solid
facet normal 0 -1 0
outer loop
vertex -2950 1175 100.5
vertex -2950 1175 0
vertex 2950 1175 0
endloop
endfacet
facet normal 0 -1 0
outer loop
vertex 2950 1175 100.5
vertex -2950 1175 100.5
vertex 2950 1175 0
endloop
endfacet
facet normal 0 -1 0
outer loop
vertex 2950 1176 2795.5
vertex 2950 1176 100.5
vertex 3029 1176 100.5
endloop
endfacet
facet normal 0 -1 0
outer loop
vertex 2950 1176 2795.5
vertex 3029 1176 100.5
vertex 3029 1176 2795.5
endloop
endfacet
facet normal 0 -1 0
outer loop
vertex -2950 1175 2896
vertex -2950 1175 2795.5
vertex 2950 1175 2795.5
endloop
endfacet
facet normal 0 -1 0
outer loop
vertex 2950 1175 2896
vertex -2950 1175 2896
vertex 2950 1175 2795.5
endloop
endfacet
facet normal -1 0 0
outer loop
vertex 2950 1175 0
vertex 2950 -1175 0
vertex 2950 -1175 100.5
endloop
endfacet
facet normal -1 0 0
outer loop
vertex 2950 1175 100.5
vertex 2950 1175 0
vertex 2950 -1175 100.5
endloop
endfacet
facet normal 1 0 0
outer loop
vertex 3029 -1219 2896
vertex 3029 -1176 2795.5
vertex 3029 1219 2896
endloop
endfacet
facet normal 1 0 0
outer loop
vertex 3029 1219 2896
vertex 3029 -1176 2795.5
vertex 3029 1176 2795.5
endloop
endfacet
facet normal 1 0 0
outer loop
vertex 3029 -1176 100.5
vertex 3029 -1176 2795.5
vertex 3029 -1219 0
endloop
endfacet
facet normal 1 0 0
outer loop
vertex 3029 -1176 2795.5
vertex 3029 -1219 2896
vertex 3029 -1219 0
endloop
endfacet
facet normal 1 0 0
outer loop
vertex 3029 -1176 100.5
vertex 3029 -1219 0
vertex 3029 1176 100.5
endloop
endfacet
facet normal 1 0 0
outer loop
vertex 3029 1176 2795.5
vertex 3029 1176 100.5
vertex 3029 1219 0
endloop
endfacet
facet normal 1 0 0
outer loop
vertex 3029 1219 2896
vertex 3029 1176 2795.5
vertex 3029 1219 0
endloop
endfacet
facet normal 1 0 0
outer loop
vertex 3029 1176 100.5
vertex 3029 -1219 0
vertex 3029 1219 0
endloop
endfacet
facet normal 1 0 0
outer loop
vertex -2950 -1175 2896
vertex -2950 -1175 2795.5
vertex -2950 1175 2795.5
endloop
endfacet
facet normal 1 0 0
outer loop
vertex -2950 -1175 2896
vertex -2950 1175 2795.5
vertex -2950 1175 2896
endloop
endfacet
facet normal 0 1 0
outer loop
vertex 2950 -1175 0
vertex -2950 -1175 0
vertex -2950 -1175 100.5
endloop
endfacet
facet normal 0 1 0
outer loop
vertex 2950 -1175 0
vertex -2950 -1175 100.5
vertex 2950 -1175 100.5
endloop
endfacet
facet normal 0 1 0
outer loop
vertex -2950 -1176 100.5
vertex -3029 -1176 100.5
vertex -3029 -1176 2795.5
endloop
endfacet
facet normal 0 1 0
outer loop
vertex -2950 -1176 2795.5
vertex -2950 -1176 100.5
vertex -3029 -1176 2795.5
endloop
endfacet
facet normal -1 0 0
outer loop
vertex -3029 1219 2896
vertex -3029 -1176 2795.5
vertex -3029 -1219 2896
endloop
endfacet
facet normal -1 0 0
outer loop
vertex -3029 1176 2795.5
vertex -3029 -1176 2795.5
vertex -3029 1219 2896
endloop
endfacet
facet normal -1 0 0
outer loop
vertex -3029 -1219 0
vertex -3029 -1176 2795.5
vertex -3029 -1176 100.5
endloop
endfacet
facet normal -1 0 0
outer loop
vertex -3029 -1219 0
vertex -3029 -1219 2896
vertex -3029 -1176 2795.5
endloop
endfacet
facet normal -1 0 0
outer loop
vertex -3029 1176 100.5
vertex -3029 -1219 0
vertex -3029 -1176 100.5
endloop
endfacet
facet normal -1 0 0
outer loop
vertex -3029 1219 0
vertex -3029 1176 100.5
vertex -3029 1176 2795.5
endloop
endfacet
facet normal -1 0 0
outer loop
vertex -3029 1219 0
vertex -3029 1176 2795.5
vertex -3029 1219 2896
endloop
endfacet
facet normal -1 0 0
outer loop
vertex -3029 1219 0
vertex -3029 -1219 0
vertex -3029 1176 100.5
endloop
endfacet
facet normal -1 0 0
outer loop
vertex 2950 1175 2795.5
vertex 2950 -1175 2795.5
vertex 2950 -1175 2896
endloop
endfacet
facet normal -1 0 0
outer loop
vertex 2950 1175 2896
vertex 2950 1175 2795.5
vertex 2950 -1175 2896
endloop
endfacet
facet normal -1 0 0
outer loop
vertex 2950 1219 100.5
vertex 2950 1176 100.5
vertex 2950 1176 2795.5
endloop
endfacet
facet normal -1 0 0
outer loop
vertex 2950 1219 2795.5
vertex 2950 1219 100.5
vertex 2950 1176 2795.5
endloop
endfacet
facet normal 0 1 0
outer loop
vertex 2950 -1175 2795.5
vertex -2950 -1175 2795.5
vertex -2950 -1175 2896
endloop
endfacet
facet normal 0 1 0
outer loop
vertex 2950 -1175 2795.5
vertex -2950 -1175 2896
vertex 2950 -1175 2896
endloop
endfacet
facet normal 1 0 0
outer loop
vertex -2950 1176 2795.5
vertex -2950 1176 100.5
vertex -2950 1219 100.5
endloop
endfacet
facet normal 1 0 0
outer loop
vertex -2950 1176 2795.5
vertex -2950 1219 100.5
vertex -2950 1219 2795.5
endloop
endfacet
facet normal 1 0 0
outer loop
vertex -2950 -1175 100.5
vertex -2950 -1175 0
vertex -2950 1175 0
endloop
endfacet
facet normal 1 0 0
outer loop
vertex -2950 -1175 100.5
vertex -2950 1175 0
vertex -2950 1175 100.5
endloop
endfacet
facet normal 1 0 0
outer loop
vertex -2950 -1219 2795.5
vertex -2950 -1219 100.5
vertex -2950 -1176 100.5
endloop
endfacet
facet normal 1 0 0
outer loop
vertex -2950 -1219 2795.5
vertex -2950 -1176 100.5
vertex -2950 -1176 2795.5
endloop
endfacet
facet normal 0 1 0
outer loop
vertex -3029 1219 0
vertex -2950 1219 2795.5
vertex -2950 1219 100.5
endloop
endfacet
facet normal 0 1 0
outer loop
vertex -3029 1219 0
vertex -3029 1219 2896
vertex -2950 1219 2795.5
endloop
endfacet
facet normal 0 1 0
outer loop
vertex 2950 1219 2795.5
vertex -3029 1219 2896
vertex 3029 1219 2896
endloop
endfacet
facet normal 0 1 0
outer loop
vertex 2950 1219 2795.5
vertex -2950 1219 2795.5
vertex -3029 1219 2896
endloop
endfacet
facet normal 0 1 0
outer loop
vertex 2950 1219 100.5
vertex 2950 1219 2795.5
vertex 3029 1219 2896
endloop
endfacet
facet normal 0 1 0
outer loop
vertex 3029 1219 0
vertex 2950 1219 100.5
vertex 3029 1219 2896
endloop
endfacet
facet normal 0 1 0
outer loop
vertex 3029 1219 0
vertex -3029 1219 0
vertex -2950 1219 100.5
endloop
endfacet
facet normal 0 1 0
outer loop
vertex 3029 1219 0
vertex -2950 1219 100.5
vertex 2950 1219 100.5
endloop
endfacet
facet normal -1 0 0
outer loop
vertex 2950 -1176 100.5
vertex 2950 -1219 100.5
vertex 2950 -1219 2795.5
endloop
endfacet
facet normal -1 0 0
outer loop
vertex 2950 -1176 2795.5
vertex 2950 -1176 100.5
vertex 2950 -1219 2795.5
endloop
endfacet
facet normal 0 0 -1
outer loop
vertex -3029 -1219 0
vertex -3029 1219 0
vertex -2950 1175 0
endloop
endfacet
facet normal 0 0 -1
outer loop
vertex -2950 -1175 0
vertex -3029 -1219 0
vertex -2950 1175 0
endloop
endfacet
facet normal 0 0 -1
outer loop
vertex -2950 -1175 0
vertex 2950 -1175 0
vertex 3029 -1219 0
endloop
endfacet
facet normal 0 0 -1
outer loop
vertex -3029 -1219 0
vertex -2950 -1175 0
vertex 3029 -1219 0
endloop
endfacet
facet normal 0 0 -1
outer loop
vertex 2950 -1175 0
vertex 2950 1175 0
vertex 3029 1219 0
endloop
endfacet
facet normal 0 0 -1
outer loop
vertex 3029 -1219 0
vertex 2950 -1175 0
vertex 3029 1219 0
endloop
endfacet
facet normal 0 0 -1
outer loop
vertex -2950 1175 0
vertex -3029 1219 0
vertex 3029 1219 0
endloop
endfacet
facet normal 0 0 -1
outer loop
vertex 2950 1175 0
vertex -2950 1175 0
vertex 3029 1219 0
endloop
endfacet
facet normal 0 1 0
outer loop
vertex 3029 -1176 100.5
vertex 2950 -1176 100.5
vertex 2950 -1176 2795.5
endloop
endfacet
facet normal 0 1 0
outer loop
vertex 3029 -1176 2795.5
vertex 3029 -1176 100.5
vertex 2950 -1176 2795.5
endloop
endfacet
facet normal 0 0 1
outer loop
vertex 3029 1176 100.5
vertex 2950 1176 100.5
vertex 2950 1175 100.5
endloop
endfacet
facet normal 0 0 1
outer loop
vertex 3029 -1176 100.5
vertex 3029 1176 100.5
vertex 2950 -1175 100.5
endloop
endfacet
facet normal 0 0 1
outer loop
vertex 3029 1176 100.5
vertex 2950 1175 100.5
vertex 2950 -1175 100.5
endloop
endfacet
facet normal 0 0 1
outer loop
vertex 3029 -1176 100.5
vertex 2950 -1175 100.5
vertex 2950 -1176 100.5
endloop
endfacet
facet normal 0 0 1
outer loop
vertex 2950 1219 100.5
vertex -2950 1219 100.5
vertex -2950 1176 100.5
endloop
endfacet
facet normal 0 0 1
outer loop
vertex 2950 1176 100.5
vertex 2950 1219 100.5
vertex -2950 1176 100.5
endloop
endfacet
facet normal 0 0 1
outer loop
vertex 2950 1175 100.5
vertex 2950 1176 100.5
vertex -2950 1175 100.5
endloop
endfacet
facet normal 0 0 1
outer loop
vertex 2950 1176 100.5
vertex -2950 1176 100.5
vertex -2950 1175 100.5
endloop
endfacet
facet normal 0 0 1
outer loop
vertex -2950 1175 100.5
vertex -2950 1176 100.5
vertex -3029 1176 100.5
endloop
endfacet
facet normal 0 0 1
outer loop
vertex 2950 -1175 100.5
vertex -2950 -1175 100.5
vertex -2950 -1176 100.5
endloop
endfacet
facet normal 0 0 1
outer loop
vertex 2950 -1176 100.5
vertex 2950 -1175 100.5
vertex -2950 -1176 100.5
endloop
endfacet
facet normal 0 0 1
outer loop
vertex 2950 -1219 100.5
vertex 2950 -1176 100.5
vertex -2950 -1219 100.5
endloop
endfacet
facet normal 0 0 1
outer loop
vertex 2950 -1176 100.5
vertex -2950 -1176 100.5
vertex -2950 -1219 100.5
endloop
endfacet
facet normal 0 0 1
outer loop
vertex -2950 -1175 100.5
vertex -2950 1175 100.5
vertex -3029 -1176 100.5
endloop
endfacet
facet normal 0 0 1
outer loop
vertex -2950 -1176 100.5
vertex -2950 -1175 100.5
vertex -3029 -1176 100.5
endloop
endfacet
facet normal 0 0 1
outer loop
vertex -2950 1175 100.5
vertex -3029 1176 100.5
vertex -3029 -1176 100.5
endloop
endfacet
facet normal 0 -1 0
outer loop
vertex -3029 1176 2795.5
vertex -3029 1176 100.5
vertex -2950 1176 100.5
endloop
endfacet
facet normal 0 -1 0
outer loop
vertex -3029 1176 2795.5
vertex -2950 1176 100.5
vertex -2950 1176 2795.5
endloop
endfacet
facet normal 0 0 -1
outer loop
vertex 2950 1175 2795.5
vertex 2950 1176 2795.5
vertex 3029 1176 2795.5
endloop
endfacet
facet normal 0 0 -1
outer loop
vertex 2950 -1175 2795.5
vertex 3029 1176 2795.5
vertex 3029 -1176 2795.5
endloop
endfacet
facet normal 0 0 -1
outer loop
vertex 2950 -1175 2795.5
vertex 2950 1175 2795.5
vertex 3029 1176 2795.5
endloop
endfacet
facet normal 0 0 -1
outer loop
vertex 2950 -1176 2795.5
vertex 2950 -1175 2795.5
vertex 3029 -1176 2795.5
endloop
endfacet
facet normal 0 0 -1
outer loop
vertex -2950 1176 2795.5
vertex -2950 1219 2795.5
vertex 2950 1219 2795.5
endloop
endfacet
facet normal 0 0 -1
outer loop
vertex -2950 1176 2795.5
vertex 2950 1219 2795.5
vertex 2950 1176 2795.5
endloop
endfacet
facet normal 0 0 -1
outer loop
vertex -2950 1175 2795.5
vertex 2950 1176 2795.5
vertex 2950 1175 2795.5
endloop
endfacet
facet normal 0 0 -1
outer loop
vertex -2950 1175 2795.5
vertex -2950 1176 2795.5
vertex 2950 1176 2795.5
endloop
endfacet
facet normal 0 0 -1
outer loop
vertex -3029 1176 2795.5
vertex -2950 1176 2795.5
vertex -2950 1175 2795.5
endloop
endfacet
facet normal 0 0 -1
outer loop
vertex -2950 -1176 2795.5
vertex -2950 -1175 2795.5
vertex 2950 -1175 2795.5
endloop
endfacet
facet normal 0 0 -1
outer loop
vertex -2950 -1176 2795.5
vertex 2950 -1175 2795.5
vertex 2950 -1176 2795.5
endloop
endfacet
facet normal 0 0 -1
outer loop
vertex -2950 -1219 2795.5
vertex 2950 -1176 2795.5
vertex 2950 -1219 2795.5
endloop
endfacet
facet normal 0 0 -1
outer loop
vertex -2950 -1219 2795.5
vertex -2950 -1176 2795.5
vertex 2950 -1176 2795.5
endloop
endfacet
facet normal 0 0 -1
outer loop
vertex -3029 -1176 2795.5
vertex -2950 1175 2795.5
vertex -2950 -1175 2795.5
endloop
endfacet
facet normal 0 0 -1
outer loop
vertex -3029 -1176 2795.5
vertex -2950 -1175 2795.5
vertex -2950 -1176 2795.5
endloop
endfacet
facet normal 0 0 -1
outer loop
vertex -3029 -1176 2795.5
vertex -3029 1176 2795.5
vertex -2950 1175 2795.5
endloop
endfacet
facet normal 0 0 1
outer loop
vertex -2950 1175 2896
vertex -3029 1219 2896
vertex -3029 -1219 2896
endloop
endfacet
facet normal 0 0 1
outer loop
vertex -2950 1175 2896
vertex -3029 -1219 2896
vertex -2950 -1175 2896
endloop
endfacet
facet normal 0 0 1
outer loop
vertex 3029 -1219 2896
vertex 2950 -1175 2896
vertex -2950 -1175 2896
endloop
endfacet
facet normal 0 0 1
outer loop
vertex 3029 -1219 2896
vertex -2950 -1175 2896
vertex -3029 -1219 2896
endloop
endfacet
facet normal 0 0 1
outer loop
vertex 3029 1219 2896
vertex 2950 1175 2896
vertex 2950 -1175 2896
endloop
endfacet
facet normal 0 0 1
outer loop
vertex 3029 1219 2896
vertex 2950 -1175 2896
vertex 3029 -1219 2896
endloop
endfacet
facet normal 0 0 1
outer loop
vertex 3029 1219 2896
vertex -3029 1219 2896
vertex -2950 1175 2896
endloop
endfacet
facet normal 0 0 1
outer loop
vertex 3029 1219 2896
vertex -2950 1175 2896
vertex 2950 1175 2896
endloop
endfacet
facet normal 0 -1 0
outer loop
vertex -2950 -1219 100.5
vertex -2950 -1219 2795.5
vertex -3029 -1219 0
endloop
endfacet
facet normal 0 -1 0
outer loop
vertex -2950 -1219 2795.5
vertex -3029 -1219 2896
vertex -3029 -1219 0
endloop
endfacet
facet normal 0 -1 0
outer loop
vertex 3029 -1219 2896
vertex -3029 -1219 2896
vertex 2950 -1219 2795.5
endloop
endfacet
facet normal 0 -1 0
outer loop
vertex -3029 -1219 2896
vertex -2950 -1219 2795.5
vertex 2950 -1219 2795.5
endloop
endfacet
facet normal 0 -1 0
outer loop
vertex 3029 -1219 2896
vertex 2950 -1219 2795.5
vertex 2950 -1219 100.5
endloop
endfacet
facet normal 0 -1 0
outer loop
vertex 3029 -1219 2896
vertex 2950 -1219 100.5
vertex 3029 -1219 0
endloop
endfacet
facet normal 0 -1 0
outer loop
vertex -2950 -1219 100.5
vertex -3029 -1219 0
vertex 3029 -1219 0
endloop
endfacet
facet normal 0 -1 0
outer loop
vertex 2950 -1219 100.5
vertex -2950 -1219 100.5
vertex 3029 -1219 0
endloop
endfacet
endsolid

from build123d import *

# Parameters (mm, degrees)
F4_W     = 6058
F4_H     = 2438
F4_W_2   = 5900
F4_H_2   = 2350
F0_DEPTH = 2896
F1_W     = 5900
F1_H     = 2695
F5_DEPTH = 2438.001
F2_W     = 2352
F2_H     = 2695
F3_DEPTH = 6058.001


with BuildPart() as f0:
    # F4 (on Top) → F0 (new body)
    with BuildSketch(Plane.XY):
        Rectangle(F4_W, F4_H)
        Rectangle(F4_W_2, F4_H_2, mode=Mode.SUBTRACT)
    extrude(amount=F0_DEPTH)

    # F1 (on face) → F5 (cut, through all)
    with BuildSketch(Plane.XZ.offset(1219)):
        with Locations((0, 1448)):
            Rectangle(F1_W, F1_H)
    extrude(amount=-F5_DEPTH, mode=Mode.SUBTRACT)

    # F2 (on face) → F3 (cut, through all)
    with BuildSketch(Plane(origin=(-3029, 0, 0), x_dir=(0, -1, 0), z_dir=(-1, 0, 0))):
        with Locations((0, 1448)):
            Rectangle(F2_W, F2_H)
    extrude(amount=-F3_DEPTH, mode=Mode.SUBTRACT)


solid = f0.part
